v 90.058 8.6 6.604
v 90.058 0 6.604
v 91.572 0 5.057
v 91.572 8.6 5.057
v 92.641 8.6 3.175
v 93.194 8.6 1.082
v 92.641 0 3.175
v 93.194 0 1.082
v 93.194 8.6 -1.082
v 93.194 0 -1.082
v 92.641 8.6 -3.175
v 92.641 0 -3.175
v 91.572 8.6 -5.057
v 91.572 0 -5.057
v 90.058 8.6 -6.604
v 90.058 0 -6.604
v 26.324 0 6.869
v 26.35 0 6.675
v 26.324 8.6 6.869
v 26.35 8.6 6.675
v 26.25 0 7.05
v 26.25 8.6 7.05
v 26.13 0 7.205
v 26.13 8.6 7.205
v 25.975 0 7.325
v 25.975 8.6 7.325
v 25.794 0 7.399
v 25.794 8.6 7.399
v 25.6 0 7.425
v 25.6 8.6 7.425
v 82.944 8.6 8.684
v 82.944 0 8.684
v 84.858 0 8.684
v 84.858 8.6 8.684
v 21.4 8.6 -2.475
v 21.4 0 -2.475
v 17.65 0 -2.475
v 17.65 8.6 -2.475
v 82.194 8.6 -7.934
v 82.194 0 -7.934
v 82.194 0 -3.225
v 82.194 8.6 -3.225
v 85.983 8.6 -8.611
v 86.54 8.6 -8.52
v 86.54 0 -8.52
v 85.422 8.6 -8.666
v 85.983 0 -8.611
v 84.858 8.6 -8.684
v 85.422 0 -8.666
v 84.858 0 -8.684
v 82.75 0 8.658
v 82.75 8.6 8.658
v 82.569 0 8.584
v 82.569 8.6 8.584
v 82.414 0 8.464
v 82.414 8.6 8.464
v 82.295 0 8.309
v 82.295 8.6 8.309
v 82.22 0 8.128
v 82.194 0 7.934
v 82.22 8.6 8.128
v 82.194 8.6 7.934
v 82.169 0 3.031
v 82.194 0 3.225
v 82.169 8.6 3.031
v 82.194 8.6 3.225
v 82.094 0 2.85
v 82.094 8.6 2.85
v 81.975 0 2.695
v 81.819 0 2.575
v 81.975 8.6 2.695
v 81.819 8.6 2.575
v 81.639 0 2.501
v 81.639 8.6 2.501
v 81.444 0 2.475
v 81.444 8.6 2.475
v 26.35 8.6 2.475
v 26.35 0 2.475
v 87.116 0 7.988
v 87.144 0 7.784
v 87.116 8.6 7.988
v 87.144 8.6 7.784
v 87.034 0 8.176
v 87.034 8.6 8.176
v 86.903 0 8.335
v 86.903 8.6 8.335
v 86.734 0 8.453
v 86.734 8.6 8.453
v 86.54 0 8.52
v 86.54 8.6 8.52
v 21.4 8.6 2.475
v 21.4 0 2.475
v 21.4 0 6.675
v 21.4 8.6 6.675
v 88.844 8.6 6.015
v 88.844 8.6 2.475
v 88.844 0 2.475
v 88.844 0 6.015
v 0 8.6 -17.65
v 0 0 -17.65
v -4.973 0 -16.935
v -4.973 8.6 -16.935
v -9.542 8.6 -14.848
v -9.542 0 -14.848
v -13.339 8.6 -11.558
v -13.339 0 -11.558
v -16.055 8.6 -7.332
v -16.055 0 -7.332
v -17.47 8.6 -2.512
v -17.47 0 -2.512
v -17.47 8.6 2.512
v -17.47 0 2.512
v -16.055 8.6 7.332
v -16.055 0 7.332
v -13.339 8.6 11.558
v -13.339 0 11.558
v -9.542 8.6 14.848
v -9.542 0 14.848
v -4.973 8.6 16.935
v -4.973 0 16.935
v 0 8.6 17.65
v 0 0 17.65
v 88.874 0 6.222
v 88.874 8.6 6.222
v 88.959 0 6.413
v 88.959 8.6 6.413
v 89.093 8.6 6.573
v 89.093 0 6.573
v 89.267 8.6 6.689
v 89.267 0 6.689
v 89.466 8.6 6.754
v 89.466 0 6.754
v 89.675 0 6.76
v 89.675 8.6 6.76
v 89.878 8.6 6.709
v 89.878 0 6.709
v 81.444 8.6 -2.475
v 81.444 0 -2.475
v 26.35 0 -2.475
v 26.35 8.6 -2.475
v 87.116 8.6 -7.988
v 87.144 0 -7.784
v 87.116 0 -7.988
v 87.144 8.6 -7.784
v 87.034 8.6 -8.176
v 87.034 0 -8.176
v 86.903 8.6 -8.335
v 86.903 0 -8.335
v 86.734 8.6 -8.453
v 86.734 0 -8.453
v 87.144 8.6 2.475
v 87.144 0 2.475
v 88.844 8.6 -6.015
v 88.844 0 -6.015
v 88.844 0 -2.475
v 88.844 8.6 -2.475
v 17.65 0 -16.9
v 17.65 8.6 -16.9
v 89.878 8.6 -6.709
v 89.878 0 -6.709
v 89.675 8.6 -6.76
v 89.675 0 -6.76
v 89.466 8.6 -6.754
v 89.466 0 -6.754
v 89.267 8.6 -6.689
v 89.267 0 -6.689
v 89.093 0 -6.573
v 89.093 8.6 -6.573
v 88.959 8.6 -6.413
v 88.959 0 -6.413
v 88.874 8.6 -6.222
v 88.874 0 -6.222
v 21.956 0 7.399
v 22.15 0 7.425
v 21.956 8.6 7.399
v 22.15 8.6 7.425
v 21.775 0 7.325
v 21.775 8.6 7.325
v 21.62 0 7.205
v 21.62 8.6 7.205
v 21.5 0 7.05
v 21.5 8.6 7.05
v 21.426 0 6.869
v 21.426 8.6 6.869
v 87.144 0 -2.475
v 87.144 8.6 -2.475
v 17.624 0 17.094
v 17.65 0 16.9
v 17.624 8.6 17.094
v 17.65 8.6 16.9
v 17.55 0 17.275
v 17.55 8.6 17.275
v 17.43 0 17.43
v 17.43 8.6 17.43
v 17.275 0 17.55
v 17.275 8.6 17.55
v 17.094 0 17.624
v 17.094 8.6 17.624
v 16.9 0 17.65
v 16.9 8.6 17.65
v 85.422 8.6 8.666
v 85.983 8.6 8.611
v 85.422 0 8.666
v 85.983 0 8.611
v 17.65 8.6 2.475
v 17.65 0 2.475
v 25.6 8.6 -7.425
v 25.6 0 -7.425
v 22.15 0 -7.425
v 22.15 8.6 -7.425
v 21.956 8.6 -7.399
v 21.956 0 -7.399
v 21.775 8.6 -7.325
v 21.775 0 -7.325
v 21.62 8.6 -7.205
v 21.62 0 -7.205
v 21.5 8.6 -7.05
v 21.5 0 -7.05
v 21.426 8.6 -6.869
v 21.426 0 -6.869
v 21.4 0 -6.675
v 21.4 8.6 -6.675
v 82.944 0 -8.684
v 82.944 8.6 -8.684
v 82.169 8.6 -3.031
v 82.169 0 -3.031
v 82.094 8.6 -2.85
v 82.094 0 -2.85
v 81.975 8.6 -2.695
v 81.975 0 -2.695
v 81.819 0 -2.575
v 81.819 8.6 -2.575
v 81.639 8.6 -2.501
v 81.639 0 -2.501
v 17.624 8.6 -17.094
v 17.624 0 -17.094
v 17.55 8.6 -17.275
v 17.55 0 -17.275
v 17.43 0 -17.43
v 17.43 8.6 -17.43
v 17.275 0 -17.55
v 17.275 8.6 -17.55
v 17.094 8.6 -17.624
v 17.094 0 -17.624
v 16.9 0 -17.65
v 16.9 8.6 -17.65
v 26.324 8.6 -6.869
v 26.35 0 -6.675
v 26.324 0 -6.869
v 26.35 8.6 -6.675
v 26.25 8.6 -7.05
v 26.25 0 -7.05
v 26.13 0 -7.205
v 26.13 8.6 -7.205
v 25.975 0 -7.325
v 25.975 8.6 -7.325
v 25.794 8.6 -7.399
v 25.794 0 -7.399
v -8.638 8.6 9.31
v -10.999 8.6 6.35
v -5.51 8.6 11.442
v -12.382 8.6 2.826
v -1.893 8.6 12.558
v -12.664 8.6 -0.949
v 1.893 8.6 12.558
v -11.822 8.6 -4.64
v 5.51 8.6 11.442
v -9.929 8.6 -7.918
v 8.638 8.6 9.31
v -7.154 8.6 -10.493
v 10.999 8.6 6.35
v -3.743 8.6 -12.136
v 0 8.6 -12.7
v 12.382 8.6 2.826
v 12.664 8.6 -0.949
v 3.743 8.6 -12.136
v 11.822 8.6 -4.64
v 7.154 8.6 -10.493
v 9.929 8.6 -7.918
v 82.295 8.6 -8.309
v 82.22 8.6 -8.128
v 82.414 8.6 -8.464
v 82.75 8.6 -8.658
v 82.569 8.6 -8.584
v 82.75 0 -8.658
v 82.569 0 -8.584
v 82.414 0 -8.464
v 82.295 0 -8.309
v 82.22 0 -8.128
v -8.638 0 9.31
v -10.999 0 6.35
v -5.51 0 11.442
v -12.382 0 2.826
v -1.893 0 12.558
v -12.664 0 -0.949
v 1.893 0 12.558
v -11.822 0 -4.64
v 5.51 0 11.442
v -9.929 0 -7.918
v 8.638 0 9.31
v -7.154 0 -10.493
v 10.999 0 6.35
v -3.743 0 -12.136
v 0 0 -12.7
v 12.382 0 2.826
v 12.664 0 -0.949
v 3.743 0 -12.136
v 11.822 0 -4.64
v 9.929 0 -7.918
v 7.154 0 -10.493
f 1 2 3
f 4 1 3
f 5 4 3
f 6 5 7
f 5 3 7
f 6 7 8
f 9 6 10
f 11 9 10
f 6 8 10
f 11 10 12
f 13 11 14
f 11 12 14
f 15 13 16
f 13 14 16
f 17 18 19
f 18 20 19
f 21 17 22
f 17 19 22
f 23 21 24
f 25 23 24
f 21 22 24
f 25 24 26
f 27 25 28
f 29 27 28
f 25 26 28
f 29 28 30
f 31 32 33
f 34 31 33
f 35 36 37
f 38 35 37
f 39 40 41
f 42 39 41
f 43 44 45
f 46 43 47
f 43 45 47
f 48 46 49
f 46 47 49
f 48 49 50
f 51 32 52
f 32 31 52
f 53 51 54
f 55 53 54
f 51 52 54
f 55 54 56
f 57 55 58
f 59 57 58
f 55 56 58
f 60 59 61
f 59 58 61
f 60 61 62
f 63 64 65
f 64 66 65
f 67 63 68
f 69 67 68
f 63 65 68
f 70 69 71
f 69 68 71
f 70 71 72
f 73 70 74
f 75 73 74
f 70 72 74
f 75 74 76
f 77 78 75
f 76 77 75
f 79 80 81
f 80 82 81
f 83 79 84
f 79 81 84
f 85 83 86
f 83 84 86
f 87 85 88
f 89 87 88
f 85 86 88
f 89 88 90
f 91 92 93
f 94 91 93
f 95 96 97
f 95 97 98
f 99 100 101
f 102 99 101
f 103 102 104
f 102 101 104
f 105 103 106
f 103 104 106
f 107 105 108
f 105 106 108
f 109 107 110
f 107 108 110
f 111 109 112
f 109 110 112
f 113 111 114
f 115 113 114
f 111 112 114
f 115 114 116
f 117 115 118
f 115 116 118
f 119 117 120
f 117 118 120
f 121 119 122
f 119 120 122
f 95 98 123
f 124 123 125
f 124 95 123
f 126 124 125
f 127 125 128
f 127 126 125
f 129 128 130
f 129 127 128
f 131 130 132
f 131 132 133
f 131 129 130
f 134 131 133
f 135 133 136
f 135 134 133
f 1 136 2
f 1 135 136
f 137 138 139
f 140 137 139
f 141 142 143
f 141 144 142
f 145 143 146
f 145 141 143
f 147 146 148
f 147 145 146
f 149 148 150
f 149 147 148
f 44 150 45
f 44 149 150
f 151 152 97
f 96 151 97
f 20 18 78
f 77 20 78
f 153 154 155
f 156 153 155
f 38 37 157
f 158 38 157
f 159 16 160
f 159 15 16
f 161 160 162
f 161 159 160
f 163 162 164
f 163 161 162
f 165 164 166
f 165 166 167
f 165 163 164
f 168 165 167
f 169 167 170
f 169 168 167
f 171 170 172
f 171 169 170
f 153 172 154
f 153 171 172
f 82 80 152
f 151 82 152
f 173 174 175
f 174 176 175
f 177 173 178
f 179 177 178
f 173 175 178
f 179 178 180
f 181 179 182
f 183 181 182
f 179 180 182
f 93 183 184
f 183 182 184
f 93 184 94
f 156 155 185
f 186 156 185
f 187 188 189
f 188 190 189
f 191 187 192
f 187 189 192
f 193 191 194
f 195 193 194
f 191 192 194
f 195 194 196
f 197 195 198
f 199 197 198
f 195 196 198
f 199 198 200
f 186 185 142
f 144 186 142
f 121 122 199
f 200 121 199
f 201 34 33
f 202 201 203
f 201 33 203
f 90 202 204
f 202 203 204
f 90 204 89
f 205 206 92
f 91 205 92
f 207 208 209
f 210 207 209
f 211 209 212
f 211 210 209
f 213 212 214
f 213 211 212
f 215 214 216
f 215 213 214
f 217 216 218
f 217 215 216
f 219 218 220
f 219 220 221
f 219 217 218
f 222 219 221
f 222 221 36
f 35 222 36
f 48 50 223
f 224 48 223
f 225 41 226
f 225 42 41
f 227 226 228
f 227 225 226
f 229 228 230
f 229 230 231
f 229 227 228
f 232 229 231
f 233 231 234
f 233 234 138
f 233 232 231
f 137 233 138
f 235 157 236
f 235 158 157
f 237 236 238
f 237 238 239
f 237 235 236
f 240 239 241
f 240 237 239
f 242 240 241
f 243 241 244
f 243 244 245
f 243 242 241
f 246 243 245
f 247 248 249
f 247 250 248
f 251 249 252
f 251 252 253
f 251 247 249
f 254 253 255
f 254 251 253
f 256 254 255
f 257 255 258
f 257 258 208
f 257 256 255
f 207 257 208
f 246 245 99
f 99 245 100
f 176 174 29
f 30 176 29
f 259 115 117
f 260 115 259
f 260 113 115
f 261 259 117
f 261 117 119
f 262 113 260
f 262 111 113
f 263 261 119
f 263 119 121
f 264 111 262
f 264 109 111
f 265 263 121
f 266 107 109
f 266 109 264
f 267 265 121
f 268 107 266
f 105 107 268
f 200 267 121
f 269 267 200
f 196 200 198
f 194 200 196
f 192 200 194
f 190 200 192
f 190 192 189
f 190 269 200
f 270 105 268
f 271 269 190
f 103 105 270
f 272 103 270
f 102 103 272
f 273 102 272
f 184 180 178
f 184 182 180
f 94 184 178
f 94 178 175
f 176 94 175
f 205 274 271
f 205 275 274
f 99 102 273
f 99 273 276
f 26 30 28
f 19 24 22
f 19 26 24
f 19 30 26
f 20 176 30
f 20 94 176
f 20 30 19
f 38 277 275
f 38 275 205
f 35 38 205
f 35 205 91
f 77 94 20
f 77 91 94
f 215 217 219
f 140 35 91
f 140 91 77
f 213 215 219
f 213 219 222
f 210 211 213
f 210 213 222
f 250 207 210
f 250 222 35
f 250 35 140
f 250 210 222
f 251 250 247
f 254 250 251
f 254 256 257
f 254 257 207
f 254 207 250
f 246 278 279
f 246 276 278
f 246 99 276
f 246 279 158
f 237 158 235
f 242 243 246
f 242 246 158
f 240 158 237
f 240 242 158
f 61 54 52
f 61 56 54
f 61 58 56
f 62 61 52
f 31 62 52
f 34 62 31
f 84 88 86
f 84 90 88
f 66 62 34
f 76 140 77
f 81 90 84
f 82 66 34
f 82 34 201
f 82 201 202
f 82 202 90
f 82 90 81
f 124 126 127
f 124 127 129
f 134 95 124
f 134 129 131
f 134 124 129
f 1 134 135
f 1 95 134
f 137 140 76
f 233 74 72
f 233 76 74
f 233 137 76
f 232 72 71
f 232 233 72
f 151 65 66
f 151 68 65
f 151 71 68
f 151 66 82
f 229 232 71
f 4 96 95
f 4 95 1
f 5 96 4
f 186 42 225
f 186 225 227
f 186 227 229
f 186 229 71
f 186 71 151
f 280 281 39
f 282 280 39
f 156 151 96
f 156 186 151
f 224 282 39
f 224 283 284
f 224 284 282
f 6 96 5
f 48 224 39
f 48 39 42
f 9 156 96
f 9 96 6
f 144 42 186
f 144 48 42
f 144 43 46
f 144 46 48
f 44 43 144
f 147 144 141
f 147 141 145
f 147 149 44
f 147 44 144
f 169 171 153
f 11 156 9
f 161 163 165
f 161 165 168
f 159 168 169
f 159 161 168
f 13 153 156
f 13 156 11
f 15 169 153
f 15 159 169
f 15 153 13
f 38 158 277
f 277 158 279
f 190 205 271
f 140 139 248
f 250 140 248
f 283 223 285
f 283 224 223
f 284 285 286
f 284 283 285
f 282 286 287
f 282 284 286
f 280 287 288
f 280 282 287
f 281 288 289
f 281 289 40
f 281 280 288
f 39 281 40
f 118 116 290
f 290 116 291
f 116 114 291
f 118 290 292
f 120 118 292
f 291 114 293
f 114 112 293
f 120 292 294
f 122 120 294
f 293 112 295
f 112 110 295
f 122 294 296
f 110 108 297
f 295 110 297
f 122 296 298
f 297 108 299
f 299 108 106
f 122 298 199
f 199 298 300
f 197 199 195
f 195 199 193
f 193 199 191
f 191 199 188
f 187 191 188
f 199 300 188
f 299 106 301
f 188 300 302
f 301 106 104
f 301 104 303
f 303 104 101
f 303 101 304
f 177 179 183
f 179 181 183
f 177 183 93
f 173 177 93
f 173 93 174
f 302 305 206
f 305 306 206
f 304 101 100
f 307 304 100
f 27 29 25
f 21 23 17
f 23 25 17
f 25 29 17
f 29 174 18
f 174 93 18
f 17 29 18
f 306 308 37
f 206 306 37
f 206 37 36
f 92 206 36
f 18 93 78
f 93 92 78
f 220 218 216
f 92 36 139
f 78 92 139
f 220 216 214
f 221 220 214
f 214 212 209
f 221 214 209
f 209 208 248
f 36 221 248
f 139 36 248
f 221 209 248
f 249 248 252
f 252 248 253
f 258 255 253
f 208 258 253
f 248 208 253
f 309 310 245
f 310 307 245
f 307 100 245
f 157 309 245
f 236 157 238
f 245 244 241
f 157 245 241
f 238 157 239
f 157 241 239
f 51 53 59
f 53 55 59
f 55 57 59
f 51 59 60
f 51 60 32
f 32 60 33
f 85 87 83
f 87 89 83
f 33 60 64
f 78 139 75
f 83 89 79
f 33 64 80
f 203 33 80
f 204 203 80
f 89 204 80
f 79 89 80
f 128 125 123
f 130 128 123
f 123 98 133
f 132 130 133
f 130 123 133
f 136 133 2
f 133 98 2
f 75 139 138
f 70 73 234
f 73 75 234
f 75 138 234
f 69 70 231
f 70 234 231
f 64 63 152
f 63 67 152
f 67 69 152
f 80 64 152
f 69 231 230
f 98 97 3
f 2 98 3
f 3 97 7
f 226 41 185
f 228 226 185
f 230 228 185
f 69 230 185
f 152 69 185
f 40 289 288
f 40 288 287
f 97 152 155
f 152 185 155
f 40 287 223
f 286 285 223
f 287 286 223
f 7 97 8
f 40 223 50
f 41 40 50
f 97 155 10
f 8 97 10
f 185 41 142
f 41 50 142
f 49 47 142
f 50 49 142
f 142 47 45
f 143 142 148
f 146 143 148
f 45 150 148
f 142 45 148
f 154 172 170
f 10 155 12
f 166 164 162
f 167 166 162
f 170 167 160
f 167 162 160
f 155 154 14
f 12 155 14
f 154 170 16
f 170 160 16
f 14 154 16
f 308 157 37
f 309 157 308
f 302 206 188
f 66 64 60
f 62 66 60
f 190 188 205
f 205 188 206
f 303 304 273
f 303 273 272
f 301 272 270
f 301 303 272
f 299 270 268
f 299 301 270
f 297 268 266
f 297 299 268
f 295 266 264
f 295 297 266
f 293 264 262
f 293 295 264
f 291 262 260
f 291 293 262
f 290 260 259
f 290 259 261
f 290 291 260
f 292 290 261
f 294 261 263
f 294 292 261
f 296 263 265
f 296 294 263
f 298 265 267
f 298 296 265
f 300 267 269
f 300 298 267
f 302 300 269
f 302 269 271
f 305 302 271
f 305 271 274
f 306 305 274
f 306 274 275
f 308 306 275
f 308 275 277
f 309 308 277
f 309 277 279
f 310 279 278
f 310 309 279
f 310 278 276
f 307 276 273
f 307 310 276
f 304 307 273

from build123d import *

# Parameters (mm, degrees)
SKETCH1_R           = 12.7
BOSS_EXTRUDE1_DEPTH = 8.6
FILLET2_R           = 0.75


with BuildPart() as part:
    # Sketch1 → Boss-Extrude1 (new body)
    with BuildSketch(Plane(origin=(0, 0, 0), x_dir=(1, 0, 0), z_dir=(0, 1, 0))):
        with BuildLine():
            Line((88.844407291, -2.475), (88.844407291, -7.400365603))
            ThreePointArc((88.844407291, -7.400365603), (93.263798172, 0), (88.844407291, 7.400365603))
            Line((88.844407291, 7.400365603), (88.844407291, 2.475))
            Line((88.844407291, 2.475), (87.144407291, 2.475))
            Line((87.144407291, 2.475), (87.144407291, 8.377664326))
            ThreePointArc((87.144407291, 8.377664326), (86.01145531, 8.60710798), (84.85806661, 8.684043601))
            Line((84.85806661, 8.684043601), (82.194407291, 8.684043601))
            Line((82.194407291, 8.684043601), (82.194407291, 2.475))
            Line((82.194407291, 2.475), (26.35, 2.475))
            Line((26.35, 2.475), (26.35, 7.425))
            Line((26.35, 7.425), (21.4, 7.425))
            Line((21.4, 7.425), (21.4, 2.475))
            Line((21.4, 2.475), (17.65, 2.475))
            Line((17.65, 2.475), (17.65, 17.65))
            Line((17.65, 17.65), (0, 17.65))
            ThreePointArc((0, 17.65), (-17.65, 0), (0, -17.65))
            Line((0, -17.65), (17.65, -17.65))
            Line((17.65, -17.65), (17.65, -2.475))
            Line((17.65, -2.475), (21.4, -2.475))
            Line((21.4, -2.475), (21.4, -7.425))
            Line((21.4, -7.425), (26.35, -7.425))
            Line((26.35, -7.425), (26.35, -2.475))
            Line((26.35, -2.475), (82.194407291, -2.475))
            Line((82.194407291, -2.475), (82.194407291, -8.684043601))
            Line((82.194407291, -8.684043601), (84.85806661, -8.684043601))
            ThreePointArc((84.85806661, -8.684043601), (86.01145531, -8.60710798), (87.144407291, -8.377664326))
            Line((87.144407291, -8.377664326), (87.144407291, -2.475))
            Line((87.144407291, -2.475), (88.844407291, -2.475))
        make_face()
        with Locations(Location((0, 0, 0), (0, 0, 90))):
            Circle(SKETCH1_R, mode=Mode.SUBTRACT)
    extrude(amount=BOSS_EXTRUDE1_DEPTH)

    # Fillet2
    fillet2_edges = [part.edges().sort_by_distance(p)[0] for p in [
        (21.4, 4.3, -7.425),
        (26.35, 4.3, -7.425),
        (82.194407291, 4.3, -2.475),
        (82.194407291, 4.3, -8.684043601),
        (87.144407291, 4.3, -8.377664326),
        (88.844407291, 4.3, -7.400365603),
        (88.844407291, 4.3, 7.400365603),
        (87.144407291, 4.3, 8.377664326),
        (82.194407291, 4.3, 8.684043601),
        (82.194407291, 4.3, 2.475),
        (26.35, 4.3, 7.425),
        (21.4, 4.3, 7.425),
        (17.65, 4.3, 17.65),
        (17.65, 4.3, -17.65),
    ]]
    fillet(fillet2_edges, radius=FILLET2_R)


solid = part.part
